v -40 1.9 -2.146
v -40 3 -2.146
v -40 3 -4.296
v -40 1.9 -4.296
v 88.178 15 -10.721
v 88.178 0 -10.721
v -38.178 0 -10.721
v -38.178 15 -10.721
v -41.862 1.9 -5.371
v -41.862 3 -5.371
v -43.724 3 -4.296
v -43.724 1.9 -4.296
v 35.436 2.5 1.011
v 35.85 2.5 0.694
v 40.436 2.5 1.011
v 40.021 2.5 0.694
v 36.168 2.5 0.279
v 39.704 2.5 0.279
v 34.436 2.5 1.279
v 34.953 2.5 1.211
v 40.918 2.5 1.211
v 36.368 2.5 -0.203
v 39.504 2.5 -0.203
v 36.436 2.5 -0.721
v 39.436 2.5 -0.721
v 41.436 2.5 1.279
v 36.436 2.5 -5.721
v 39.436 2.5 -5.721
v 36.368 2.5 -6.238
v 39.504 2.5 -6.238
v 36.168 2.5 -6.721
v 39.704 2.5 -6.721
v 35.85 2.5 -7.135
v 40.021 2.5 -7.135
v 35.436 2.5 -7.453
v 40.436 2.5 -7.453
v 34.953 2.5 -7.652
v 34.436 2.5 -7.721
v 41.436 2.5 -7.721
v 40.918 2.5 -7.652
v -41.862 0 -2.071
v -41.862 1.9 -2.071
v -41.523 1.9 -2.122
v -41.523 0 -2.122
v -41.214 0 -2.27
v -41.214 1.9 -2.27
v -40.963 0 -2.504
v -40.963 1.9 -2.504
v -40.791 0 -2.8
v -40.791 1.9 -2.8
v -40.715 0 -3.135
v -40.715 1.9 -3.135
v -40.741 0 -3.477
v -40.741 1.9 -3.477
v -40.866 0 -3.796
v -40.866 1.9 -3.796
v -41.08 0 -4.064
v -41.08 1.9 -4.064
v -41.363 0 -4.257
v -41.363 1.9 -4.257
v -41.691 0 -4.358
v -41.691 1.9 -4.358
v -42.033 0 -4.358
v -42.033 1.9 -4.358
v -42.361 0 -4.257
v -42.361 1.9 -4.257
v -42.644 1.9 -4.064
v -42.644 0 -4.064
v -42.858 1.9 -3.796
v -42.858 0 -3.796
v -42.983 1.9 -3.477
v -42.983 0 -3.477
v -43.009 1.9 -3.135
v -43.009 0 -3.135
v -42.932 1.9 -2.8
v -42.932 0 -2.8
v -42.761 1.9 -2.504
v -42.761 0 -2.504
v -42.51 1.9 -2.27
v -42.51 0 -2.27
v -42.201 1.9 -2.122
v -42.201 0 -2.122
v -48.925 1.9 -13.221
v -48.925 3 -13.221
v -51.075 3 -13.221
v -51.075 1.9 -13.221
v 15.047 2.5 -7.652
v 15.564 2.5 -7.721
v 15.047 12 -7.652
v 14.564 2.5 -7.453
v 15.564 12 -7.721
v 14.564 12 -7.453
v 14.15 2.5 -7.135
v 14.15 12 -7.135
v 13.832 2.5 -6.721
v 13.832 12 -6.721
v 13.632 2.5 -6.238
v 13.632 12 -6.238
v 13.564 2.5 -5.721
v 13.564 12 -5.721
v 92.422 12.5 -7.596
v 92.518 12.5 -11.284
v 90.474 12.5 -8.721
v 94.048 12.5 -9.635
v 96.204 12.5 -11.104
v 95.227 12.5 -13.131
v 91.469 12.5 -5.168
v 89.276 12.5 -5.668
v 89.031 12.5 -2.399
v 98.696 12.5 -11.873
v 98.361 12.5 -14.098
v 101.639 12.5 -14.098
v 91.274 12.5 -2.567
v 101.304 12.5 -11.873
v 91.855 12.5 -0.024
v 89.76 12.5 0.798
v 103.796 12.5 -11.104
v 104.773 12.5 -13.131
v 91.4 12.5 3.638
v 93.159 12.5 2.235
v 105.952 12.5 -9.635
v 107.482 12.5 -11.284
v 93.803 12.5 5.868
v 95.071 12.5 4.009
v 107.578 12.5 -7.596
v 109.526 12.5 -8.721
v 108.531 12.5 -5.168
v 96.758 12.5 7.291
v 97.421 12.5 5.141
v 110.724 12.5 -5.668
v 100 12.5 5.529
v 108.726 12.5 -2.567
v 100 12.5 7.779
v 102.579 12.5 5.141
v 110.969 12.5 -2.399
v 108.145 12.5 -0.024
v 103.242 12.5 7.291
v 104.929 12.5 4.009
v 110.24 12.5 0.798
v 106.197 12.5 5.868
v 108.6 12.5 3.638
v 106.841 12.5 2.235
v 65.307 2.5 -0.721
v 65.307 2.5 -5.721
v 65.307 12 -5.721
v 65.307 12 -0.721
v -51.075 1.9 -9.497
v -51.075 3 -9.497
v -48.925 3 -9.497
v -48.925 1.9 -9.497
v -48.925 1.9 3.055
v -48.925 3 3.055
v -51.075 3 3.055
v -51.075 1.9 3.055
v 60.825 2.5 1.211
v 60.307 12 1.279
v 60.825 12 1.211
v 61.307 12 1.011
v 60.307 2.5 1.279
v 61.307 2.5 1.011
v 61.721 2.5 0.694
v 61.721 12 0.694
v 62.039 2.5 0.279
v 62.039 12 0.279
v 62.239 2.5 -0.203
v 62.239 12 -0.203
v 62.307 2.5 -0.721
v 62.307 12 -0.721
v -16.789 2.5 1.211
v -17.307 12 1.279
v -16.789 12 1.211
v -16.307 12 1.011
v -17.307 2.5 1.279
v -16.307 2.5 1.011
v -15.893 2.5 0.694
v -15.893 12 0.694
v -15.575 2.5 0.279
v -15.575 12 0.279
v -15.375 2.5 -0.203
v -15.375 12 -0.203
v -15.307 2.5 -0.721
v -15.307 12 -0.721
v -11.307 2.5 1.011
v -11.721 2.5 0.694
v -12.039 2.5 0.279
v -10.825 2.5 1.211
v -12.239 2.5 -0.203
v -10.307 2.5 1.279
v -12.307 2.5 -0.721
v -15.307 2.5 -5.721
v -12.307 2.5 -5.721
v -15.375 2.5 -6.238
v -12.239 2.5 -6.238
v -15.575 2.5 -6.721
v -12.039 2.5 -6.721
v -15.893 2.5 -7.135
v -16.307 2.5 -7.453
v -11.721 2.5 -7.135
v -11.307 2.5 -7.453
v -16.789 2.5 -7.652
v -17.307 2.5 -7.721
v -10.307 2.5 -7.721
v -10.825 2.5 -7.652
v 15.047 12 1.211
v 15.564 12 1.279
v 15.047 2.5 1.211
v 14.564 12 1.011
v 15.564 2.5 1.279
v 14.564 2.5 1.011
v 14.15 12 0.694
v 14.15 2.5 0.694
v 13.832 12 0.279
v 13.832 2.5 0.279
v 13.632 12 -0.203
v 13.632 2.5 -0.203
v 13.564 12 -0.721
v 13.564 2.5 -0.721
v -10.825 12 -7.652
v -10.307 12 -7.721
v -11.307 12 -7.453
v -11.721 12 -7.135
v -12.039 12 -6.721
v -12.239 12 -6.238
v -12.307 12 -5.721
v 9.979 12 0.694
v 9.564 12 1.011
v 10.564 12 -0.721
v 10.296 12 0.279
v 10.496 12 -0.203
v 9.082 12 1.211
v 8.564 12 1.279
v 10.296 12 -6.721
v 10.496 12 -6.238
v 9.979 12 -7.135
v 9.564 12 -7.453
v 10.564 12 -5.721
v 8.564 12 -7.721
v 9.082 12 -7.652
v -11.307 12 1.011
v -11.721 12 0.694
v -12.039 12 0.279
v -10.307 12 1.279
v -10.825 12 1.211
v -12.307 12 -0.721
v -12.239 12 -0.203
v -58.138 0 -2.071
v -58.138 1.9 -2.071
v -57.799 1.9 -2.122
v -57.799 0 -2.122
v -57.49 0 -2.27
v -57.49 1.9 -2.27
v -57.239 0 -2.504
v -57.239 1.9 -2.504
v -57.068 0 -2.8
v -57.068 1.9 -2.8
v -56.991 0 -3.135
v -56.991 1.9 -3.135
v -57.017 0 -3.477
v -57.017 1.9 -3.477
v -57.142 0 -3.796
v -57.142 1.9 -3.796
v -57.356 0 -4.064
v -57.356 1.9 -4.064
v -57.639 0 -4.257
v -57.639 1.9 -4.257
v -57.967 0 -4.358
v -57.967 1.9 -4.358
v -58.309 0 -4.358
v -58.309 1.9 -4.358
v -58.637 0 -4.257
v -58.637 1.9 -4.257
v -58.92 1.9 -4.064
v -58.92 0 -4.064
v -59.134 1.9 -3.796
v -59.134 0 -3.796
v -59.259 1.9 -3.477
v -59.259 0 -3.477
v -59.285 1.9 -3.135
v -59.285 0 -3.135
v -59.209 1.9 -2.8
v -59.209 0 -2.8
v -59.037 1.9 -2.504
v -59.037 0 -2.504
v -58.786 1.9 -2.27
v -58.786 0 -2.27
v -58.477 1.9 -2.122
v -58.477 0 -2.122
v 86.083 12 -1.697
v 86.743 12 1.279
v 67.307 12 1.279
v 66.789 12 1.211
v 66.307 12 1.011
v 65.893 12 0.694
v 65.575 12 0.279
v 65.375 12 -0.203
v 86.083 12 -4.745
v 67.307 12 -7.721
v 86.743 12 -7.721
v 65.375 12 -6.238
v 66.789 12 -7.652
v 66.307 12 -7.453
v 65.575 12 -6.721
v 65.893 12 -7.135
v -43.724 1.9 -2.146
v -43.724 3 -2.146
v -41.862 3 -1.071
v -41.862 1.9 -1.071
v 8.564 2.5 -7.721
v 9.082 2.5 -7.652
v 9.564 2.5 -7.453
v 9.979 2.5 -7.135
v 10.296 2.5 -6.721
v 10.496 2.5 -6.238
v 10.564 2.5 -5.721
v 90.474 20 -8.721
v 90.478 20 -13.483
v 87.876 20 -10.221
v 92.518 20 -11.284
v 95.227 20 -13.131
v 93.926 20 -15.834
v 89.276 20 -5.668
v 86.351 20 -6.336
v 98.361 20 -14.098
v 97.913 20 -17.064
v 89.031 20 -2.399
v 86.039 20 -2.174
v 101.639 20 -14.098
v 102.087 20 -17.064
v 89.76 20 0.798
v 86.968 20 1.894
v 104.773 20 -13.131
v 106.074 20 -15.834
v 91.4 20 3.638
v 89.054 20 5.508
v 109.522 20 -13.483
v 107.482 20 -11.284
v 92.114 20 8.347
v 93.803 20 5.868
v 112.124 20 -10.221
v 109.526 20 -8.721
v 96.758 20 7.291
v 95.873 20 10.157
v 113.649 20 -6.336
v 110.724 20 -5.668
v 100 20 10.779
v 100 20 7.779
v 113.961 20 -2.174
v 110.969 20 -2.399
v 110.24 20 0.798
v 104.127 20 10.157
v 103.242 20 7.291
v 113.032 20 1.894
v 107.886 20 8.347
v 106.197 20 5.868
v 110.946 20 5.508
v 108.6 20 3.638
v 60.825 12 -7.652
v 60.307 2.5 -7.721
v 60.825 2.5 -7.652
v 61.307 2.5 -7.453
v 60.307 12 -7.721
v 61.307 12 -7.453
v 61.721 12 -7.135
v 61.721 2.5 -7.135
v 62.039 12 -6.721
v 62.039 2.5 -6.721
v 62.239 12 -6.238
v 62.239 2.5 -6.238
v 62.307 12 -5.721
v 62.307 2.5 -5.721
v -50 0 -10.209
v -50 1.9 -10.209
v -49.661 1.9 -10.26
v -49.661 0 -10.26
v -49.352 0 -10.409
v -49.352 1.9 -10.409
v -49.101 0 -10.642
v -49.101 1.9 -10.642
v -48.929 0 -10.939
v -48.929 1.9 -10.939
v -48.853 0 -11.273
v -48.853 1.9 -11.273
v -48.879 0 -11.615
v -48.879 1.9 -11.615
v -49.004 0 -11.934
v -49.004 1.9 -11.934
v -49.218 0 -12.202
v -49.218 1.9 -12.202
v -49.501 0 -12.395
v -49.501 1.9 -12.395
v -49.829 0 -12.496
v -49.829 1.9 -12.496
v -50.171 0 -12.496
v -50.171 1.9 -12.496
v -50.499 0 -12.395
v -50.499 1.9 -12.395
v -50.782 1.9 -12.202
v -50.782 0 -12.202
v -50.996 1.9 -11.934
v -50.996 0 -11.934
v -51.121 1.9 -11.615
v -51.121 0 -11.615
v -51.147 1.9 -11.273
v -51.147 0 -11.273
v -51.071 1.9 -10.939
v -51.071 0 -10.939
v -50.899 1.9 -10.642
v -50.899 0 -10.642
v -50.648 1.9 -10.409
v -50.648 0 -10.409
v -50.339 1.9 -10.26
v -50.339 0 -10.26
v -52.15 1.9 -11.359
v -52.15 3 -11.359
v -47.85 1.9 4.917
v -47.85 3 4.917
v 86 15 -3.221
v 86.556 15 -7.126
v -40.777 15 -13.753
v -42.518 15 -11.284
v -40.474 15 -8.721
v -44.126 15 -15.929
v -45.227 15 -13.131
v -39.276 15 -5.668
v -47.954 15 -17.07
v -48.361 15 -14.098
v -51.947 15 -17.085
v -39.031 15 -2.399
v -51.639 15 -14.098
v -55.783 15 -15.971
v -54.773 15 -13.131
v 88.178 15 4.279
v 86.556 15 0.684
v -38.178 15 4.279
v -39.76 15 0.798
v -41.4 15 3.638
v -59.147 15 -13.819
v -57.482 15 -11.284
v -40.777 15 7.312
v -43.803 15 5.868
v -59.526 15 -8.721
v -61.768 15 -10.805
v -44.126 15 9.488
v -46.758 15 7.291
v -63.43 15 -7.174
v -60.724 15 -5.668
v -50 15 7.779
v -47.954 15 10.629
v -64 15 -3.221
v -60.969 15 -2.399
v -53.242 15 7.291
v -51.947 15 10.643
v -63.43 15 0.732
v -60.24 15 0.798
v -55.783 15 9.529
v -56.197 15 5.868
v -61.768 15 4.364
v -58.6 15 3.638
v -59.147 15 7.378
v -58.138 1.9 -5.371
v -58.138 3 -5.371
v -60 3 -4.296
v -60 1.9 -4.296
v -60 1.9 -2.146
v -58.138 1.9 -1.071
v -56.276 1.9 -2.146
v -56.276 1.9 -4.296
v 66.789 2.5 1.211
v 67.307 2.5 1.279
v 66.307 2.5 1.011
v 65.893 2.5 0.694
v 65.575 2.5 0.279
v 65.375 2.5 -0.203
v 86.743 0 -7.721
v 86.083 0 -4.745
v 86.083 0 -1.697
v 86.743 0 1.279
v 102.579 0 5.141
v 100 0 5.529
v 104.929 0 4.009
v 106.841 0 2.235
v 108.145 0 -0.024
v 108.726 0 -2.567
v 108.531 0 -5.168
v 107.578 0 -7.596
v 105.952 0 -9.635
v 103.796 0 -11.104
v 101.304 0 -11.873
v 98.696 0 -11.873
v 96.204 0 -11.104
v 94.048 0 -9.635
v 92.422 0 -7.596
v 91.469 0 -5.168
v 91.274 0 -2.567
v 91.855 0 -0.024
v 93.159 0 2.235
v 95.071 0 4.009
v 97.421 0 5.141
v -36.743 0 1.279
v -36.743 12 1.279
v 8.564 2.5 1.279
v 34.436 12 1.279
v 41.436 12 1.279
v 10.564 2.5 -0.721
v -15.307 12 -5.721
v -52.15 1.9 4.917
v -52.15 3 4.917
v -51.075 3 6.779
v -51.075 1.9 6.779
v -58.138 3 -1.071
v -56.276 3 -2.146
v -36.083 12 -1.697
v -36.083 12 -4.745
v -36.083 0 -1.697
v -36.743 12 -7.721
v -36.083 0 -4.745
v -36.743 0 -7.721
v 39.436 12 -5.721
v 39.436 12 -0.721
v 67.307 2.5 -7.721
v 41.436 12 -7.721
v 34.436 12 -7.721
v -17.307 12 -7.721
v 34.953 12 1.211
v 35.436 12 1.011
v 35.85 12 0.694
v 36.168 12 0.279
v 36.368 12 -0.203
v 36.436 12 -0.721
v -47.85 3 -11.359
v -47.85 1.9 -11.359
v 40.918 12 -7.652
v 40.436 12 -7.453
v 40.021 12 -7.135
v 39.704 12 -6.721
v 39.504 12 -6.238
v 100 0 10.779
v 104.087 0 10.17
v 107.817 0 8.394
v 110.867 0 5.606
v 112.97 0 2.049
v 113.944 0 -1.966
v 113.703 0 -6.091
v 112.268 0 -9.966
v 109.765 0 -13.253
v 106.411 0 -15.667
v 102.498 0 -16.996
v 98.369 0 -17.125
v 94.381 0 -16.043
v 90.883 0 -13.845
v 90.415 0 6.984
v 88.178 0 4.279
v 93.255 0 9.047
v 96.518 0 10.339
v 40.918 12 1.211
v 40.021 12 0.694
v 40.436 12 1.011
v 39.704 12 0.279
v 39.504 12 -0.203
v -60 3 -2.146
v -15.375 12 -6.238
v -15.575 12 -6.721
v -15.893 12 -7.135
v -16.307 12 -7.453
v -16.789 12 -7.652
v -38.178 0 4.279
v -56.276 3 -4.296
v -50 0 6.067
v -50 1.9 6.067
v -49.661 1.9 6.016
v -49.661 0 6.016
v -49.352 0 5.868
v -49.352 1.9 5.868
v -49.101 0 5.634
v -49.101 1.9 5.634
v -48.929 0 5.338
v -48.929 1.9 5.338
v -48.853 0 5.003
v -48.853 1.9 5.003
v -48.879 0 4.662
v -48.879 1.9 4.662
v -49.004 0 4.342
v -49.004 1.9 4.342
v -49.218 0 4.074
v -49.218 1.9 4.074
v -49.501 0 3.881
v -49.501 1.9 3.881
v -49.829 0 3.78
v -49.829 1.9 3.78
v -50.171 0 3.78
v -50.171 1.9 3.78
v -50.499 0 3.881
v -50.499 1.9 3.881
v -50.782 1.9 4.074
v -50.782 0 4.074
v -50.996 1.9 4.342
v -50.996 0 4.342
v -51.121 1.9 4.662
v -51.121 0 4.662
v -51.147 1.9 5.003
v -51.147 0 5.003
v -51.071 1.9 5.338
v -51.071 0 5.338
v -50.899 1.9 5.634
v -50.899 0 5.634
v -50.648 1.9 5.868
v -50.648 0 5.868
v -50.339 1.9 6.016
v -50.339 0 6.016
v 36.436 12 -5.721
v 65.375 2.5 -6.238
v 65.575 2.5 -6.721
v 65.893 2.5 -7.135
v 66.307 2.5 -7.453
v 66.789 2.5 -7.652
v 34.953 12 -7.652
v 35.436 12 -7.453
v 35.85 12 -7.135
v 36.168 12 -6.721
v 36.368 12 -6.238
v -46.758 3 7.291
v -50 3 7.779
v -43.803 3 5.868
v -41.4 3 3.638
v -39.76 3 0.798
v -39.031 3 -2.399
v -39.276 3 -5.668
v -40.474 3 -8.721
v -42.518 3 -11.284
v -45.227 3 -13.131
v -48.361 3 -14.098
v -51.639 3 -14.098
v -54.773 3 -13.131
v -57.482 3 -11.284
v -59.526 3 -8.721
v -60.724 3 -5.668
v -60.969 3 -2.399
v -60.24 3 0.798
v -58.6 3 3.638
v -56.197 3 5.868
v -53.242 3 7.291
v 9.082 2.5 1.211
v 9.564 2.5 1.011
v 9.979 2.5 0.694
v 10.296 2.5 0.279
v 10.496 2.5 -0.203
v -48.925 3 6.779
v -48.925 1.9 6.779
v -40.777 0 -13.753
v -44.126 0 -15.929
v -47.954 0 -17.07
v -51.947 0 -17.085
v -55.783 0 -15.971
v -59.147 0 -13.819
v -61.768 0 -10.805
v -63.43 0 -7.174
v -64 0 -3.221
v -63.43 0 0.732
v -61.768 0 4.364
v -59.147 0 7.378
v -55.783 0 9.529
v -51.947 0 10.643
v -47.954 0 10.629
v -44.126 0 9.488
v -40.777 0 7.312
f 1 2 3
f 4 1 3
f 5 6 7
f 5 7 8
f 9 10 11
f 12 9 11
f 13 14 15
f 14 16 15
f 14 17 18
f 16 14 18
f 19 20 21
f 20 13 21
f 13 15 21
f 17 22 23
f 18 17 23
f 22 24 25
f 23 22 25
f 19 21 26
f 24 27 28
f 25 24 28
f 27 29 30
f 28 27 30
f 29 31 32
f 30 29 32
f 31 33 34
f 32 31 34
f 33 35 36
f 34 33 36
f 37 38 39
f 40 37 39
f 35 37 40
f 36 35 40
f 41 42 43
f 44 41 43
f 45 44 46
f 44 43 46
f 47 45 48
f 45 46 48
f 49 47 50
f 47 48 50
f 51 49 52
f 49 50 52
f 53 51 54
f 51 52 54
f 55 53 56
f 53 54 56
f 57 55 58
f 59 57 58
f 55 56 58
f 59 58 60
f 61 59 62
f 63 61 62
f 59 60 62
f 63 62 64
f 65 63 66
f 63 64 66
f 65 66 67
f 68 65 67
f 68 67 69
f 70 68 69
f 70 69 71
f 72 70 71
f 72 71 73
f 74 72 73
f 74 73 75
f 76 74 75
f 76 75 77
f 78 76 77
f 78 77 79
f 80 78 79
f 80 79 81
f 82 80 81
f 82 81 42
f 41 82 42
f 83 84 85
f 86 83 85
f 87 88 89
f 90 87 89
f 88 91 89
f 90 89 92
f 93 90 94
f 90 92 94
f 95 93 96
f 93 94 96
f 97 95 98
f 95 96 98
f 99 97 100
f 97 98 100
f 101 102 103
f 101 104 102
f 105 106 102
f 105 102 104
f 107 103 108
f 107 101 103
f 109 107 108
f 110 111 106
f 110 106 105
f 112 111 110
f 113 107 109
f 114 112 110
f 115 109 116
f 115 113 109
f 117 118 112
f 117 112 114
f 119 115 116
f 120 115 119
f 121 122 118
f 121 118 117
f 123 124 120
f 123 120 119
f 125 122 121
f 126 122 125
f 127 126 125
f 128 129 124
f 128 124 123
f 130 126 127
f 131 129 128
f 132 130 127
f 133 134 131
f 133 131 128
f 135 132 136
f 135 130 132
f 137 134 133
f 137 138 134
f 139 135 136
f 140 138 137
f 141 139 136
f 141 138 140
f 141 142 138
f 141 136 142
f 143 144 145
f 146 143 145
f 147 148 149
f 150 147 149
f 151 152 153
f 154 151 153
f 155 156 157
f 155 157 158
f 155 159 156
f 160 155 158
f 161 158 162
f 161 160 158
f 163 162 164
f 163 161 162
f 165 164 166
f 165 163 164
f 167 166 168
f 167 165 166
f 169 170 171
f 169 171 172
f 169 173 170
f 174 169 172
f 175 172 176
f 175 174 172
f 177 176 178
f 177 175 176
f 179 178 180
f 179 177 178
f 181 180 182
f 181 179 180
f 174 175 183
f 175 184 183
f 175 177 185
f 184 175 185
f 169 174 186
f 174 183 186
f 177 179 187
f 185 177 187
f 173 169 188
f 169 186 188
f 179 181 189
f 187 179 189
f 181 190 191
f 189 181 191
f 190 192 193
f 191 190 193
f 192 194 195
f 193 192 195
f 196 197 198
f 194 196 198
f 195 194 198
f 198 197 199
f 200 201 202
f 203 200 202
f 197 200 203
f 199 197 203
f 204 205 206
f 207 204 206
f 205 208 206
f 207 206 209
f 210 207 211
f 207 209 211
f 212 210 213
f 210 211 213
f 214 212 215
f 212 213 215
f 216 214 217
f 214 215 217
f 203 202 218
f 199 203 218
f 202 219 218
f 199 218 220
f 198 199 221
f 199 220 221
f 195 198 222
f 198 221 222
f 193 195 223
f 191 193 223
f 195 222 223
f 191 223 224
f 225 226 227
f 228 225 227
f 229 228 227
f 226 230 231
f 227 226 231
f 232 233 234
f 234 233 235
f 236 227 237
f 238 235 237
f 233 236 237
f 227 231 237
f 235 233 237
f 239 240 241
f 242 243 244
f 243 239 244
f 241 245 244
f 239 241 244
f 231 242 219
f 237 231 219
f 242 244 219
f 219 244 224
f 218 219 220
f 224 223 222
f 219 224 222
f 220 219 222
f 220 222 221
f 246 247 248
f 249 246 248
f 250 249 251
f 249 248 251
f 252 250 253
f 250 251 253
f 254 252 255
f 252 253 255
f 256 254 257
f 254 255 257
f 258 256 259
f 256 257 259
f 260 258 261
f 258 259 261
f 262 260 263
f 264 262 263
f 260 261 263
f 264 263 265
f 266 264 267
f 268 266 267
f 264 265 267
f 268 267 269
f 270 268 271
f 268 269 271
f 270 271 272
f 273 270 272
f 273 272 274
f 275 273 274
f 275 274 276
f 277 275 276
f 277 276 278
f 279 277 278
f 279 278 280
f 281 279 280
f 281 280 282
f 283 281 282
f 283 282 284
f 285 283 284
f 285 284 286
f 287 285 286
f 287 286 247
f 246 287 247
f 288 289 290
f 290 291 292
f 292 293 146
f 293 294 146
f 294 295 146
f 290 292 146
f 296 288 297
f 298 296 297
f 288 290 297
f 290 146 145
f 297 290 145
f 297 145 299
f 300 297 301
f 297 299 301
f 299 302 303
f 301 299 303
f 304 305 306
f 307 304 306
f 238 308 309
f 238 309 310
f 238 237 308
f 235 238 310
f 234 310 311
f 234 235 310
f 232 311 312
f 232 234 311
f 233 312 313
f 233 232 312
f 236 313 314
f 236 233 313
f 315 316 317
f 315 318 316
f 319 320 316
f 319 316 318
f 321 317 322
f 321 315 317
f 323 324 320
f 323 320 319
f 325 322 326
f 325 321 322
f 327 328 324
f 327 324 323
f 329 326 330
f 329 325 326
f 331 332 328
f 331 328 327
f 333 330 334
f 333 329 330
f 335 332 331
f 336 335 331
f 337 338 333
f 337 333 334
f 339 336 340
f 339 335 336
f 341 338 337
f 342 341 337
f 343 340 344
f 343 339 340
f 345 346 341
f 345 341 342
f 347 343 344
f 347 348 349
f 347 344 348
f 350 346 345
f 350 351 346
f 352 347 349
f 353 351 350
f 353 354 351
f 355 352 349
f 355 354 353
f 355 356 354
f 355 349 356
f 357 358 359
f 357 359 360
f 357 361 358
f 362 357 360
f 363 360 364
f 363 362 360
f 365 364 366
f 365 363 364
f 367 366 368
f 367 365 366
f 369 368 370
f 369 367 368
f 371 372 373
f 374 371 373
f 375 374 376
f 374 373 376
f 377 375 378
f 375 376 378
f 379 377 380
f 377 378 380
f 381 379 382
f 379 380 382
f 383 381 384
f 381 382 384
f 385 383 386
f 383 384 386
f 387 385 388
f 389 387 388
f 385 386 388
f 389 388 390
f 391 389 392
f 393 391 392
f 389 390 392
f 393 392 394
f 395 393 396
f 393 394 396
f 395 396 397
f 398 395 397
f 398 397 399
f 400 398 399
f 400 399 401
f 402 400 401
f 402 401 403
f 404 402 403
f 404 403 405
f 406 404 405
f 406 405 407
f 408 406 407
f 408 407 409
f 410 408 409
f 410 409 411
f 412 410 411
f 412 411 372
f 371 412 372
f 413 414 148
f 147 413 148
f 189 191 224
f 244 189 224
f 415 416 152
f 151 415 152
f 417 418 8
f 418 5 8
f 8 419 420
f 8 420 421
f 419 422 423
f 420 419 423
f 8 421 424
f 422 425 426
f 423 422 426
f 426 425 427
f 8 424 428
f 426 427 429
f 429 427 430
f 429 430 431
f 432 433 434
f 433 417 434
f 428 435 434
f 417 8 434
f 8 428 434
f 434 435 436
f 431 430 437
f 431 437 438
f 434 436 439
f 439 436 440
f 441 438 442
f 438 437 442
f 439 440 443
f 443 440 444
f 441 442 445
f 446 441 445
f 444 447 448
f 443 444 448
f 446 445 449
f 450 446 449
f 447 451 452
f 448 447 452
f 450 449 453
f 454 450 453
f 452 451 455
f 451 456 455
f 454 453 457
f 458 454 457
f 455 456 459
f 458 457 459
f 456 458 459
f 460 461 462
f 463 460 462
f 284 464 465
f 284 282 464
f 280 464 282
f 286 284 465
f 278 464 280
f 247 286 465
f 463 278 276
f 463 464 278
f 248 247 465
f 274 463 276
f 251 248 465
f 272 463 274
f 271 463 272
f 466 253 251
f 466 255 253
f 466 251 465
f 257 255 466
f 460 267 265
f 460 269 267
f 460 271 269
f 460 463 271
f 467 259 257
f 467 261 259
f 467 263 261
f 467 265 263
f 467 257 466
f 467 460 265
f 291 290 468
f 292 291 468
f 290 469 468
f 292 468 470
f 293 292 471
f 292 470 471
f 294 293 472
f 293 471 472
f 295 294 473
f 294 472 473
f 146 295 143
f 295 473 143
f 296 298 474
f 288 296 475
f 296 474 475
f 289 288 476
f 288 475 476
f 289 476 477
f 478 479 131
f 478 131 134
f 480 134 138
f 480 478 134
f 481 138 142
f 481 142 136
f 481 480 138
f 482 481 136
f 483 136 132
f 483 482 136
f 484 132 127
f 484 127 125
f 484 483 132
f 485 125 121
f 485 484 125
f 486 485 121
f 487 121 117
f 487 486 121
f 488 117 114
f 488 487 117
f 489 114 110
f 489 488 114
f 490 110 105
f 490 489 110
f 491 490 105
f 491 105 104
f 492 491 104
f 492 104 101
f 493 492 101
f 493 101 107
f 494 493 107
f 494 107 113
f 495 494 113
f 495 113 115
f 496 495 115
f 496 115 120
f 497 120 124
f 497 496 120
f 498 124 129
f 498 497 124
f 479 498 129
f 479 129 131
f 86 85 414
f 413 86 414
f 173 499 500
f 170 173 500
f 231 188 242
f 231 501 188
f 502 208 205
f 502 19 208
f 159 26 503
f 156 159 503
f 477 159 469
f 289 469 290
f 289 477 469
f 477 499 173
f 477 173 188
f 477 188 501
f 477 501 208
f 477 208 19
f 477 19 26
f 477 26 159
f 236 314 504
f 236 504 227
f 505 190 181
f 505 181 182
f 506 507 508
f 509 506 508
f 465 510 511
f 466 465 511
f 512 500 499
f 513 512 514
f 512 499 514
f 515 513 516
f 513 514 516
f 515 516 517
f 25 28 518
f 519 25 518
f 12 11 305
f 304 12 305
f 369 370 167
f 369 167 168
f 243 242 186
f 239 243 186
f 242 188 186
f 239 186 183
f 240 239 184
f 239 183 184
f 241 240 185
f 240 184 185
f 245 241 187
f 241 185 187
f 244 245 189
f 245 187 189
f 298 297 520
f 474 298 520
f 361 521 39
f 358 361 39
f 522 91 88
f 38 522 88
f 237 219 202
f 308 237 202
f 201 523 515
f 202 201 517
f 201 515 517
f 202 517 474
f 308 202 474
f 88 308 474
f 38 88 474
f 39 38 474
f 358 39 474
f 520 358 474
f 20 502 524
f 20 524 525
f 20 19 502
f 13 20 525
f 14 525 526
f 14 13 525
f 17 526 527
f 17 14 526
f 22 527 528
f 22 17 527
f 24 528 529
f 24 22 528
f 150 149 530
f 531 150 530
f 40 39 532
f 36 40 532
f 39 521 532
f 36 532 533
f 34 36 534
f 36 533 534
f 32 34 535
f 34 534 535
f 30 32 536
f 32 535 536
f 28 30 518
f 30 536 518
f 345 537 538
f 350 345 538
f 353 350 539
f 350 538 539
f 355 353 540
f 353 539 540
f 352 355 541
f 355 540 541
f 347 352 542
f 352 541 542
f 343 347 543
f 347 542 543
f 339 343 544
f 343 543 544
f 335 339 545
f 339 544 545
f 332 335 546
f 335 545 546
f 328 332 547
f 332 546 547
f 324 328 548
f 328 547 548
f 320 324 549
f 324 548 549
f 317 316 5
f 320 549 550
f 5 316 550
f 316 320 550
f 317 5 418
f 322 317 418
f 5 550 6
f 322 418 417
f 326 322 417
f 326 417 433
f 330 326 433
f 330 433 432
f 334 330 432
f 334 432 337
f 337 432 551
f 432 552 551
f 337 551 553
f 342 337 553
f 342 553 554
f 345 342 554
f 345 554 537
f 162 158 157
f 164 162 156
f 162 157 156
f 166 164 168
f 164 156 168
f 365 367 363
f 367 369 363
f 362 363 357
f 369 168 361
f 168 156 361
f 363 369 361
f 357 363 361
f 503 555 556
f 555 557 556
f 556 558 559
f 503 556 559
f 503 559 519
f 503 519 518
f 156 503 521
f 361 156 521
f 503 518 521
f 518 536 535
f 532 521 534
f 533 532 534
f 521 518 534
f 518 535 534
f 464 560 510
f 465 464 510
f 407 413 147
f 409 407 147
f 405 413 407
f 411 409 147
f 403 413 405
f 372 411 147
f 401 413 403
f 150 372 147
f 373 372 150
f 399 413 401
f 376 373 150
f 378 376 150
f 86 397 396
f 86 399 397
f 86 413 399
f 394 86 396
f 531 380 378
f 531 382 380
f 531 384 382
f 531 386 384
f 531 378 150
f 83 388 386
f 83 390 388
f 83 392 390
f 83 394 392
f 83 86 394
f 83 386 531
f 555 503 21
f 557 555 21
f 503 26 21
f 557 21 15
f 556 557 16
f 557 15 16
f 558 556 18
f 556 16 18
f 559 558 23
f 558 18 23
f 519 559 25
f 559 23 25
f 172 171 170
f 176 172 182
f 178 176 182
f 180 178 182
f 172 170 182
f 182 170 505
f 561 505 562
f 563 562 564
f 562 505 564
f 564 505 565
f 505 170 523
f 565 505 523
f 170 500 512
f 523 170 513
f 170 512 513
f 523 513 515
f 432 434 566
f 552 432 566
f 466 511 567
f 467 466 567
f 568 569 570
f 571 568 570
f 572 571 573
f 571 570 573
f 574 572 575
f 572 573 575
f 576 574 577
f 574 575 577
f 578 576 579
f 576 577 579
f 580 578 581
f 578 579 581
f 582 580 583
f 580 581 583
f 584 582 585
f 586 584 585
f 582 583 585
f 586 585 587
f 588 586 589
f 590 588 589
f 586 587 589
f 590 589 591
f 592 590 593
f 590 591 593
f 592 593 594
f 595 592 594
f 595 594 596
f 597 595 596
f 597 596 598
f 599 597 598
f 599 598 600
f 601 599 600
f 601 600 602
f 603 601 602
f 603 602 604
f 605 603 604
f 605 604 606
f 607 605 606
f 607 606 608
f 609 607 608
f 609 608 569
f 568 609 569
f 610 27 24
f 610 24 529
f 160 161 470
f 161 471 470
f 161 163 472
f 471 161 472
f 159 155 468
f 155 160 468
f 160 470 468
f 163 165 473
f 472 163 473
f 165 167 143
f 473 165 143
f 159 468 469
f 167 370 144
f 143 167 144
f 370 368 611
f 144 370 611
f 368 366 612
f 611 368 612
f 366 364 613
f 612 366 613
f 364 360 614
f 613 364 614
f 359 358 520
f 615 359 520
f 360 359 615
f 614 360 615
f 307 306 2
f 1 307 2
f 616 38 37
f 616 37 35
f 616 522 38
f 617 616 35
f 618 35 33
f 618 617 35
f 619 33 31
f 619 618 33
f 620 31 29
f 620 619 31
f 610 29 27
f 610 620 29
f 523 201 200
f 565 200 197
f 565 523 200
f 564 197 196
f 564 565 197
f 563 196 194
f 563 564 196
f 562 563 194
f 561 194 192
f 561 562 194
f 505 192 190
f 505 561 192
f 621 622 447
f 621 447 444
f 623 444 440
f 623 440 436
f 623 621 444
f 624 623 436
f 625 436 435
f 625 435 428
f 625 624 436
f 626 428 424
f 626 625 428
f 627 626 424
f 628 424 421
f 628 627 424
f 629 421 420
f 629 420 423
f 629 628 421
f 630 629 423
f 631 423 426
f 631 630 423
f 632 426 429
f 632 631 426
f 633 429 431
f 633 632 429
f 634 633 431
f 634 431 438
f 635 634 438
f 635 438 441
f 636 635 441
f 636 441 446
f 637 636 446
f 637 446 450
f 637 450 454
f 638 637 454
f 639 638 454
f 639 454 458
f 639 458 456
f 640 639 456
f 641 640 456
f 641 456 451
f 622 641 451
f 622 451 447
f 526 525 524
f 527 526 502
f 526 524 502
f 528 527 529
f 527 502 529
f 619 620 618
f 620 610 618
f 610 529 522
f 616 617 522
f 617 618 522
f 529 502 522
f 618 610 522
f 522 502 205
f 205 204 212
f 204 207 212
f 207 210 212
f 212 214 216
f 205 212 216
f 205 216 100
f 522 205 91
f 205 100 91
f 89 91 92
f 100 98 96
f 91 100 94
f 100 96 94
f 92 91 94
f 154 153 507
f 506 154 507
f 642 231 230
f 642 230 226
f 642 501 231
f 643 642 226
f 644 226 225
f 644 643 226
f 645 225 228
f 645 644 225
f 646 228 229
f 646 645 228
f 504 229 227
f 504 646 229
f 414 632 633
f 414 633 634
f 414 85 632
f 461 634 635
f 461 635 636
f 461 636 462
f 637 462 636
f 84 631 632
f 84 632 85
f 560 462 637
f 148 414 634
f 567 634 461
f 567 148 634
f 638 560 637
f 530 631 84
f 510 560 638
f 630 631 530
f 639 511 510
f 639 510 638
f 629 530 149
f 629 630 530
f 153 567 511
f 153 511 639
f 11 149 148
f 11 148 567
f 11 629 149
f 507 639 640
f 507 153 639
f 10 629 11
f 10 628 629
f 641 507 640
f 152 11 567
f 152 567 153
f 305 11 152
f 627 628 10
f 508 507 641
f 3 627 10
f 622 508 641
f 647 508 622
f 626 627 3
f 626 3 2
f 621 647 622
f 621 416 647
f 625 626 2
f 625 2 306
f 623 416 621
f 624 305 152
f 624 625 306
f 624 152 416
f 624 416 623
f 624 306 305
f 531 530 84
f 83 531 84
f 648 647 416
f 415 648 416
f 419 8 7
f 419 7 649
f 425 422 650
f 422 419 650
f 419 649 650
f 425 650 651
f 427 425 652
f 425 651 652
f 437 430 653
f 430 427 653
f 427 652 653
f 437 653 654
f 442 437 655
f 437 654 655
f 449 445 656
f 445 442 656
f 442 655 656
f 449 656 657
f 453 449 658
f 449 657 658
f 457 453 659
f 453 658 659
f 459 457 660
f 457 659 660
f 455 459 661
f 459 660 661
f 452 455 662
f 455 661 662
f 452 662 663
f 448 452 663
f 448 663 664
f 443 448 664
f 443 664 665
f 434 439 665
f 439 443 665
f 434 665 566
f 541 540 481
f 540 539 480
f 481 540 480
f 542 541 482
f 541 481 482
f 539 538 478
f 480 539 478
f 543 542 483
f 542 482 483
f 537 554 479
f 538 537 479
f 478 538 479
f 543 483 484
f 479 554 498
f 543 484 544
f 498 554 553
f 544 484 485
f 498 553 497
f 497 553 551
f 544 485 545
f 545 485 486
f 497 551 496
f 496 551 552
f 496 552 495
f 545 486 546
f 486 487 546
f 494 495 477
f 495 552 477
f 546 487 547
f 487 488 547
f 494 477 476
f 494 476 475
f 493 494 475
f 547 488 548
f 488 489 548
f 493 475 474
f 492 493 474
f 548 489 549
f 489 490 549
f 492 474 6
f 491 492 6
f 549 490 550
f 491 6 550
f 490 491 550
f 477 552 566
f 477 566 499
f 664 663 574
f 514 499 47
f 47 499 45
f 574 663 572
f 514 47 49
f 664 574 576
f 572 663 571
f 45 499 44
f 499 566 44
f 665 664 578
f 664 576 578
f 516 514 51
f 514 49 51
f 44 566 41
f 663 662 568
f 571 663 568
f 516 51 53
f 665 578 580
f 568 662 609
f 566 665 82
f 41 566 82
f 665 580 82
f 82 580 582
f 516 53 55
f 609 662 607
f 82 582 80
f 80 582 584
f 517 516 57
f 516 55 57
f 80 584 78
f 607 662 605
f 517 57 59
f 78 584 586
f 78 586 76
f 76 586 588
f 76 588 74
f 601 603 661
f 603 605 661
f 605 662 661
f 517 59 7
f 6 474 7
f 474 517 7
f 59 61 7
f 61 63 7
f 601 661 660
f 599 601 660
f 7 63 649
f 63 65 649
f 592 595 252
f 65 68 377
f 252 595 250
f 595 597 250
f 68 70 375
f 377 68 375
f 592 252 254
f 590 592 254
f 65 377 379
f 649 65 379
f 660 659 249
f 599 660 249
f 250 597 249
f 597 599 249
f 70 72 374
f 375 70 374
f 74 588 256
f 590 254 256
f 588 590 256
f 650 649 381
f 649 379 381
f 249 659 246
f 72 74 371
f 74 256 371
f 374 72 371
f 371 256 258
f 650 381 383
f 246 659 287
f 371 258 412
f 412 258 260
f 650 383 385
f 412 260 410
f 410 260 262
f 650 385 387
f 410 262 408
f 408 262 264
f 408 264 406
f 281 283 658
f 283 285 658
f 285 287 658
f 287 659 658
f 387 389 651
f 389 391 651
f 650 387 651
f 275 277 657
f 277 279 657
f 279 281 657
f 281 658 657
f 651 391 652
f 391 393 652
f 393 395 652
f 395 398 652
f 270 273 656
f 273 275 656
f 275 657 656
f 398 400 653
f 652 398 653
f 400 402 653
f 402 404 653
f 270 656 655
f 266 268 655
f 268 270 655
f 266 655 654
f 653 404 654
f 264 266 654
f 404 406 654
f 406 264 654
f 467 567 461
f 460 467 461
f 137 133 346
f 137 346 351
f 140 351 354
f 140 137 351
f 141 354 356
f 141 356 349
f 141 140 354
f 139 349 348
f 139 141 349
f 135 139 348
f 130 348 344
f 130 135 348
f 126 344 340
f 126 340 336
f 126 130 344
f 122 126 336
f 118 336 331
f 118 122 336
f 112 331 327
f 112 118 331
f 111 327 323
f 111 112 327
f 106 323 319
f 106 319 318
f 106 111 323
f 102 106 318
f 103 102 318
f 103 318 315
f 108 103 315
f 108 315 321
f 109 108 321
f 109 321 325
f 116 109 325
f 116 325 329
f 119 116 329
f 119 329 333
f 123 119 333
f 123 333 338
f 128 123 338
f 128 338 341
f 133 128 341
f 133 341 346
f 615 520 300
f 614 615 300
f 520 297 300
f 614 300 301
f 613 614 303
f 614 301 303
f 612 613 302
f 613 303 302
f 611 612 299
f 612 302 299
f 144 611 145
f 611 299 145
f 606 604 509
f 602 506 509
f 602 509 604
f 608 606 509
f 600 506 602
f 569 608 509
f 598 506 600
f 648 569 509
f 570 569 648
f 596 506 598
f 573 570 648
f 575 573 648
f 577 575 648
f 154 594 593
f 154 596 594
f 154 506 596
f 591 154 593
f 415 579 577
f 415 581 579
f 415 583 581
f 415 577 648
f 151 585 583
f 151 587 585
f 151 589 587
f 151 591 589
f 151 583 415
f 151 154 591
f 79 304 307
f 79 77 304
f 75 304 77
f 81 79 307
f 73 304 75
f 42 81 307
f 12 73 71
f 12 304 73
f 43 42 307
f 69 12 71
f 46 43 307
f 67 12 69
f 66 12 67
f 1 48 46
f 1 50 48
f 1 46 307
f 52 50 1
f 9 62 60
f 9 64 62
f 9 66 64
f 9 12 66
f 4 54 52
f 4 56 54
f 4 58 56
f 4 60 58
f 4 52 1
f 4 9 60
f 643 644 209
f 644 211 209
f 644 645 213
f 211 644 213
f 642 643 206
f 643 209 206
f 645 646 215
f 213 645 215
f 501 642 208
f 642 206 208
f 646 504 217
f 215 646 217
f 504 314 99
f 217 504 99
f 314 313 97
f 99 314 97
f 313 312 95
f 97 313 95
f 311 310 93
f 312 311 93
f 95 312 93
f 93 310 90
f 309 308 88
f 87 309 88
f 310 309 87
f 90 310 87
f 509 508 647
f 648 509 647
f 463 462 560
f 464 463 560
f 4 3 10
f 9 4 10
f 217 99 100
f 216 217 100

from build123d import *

# Parameters (mm, degrees)
SKETCH2_R                             = 14
SKETCH2_R_2                           = 11
BOSS_EXTRUDE7_DEPTH                   = 15
SKETCH2_12_R                          = 11
BOSS_EXTRUDE10_DEPTH                  = 3
SKETCH2_9_R                           = 14
SKETCH2_9_R_2                         = 11
BOSS_EXTRUDE8_DEPTH                   = 20
SKETCH2_11_R                          = 11
SKETCH2_11_R_2                        = 8.75
BOSS_EXTRUDE9_DEPTH                   = 12.5
BOSS_EXTRUDE11_REACH                  = 119.015
BOSS_EXTRUDE11_END_RADIUS             = 14
BOSS_EXTRUDE11_DIRECTION_2_REACH      = 119.015
BOSS_EXTRUDE11_DIRECTION_2_END_RADIUS = 14
CUT_EXTRUDE6_DEPTH                    = 1.1
SKETCH13_R                            = 1.15
CUT_EXTRUDE7_DEPTH                    = 3
BOSS_EXTRUDE12_REACH                  = 119.21
SKETCH15_W                            = 3
SKETCH15_H                            = 9.5
FILLET1_R                             = 2


with BuildPart() as part:
    # Sketch2 → Boss-Extrude7 (new body)
    with BuildSketch(Plane(origin=(0, 0, 0), x_dir=(1, 0, 0), z_dir=(0, 1, 0))):
        with Locations(Location((-50, 3.220631283, 0), (0, 0, 270))):
            Circle(SKETCH2_R)
        with Locations(Location((-50, 3.220631283, 0), (0, 0, 270))):
            Circle(SKETCH2_R_2, mode=Mode.SUBTRACT)
    extrude(amount=BOSS_EXTRUDE7_DEPTH)

    # Sketch2<12> → Boss-Extrude10 (add)
    with BuildSketch(Plane(origin=(0, 0, 0), x_dir=(1, 0, 0), z_dir=(0, 1, 0))):
        with Locations(Location((-50, 3.220631283, 0), (0, 0, 270))):
            Circle(SKETCH2_12_R)
    extrude(amount=BOSS_EXTRUDE10_DEPTH)


with BuildPart() as body_2:
    # Sketch2<9> → Boss-Extrude8 (new body)
    with BuildSketch(Plane(origin=(0, 0, 0), x_dir=(1, 0, 0), z_dir=(0, 1, 0))):
        with Locations(Location((100, 3.220631283, 0), (0, 0, 270))):
            Circle(SKETCH2_9_R)
        with Locations(Location((100, 3.220631283, 0), (0, 0, 270))):
            Circle(SKETCH2_9_R_2, mode=Mode.SUBTRACT)
    extrude(amount=BOSS_EXTRUDE8_DEPTH)

    # Sketch2<11> → Boss-Extrude9 (add)
    with BuildSketch(Plane(origin=(0, 0, 0), x_dir=(1, 0, 0), z_dir=(0, 1, 0))):
        with Locations(Location((100, 3.220631283, 0), (0, 0, 270))):
            Circle(SKETCH2_11_R)
        with Locations(Location((100, 3.220631283, 0), (0, 0, 270))):
            Circle(SKETCH2_11_R_2, mode=Mode.SUBTRACT)
    extrude(amount=BOSS_EXTRUDE9_DEPTH)


    add(part.part)  # Boss-Extrude11 merges part
    # Boss-Extrude11: up to this cylinder (the profile starts outside it)
    boss_extrude11_end = Plane(origin=(-50, 0.212132, -3.220631283), z_dir=(0, -1, 0)) * Cylinder(BOSS_EXTRUDE11_END_RADIUS, 267.03, mode=Mode.PRIVATE)
    # Sketch3 → Boss-Extrude11 (add, up to the surface)
    with BuildSketch(Plane(origin=(0, 0, 0), x_dir=(0, 0, -1), z_dir=(1, 0, 0)), mode=Mode.PRIVATE) as boss_extrude11_sk1:
        Polygon((10.720631283, 0), (10.720631283, 15), (-4.279368717, 15), (-4.279368717, 0), (-1.279368717, 0), (-1.279368717, 12), (7.720631283, 12), (7.720631283, 0), align=None)
    boss_extrude11_tool1 = extrude(boss_extrude11_sk1.sketch, amount=-BOSS_EXTRUDE11_REACH, mode=Mode.PRIVATE) - boss_extrude11_end
    add(boss_extrude11_tool1.solids().sort_by_distance((0, 0.212132, -9.220631))[0])

    # Boss-Extrude11 direction 2: up to this cylinder (the profile starts outside it)
    boss_extrude11_direction_2_end = Plane(origin=(100, 0.212132, -3.220631283), z_dir=(0, -1, 0)) * Cylinder(BOSS_EXTRUDE11_DIRECTION_2_END_RADIUS, 267.03, mode=Mode.PRIVATE)
    # Sketch3 → Boss-Extrude11 direction 2 (add, up to the surface)
    with BuildSketch(Plane(origin=(0, 0, 0), x_dir=(0, 0, -1), z_dir=(1, 0, 0)), mode=Mode.PRIVATE) as boss_extrude11_direction_2_sk1:
        Polygon((10.720631283, 0), (10.720631283, 15), (-4.279368717, 15), (-4.279368717, 0), (-1.279368717, 0), (-1.279368717, 12), (7.720631283, 12), (7.720631283, 0), align=None)
    boss_extrude11_direction_2_tool1 = extrude(boss_extrude11_direction_2_sk1.sketch, amount=BOSS_EXTRUDE11_DIRECTION_2_REACH, mode=Mode.PRIVATE) - boss_extrude11_direction_2_end
    add(boss_extrude11_direction_2_tool1.solids().sort_by_distance((0, 0.212132, -9.220631))[0])

    # Sketch10 → Cut-Extrude6 (cut)
    with BuildSketch(Plane(origin=(0, 3, 0), x_dir=(1, 0, 0), z_dir=(0, 1, 0))):
        Polygon((-47.85, 11.358676665), (-48.925, 13.220631283), (-51.075, 13.220631283), (-52.15, 11.358676665), (-51.075, 9.496722047), (-48.925, 9.496722047), align=None)
        Polygon((-58.138045382, 5.37063128), (-60, 4.29563128), (-60, 2.14563128), (-58.138045382, 1.07063128), (-56.276090764, 2.14563128), (-56.276090764, 4.29563128), align=None)
        Polygon((-41.861954618, 5.37063128), (-43.723909236, 4.29563128), (-43.723909236, 2.14563128), (-41.861954618, 1.07063128), (-40, 2.14563128), (-40, 4.29563128), align=None)
        Polygon((-47.85, -4.917414098), (-48.925, -3.05545948), (-51.075, -3.05545948), (-52.15, -4.917414098), (-51.075, -6.779368717), (-48.925, -6.779368717), align=None)
    extrude(amount=-CUT_EXTRUDE6_DEPTH, mode=Mode.SUBTRACT)

    # Sketch13 → Cut-Extrude7 (cut)
    with BuildSketch(Plane(origin=(0, 3, 0), x_dir=(1, 0, 0), z_dir=(0, 1, 0))):
        with Locations(Location((-50, 11.35867667, 0), (0, 0, 270))):
            Circle(SKETCH13_R)
        with Locations(Location((-41.86195462, 3.22063128, 0), (0, 0, 270))):
            Circle(SKETCH13_R)
        with Locations(Location((-50, -4.9174141, 0), (0, 0, 270))):
            Circle(SKETCH13_R)
        with Locations(Location((-58.13804538, 3.22063128, 0), (0, 0, 270))):
            Circle(SKETCH13_R)
    extrude(amount=-CUT_EXTRUDE7_DEPTH, mode=Mode.SUBTRACT)

    # Sketch15 → Boss-Extrude12 (add, up to next)
    with BuildSketch(Plane.XY.offset(-7.720631283), mode=Mode.PRIVATE) as boss_extrude12_sk1:
        with Locations((-13.807045748, 7.25)):
            Rectangle(SKETCH15_W, SKETCH15_H)
    boss_extrude12_tool1 = extrude(boss_extrude12_sk1.sketch, amount=BOSS_EXTRUDE12_REACH, mode=Mode.PRIVATE) - body_2.part
    # Sketch15 → Boss-Extrude12 (add, up to next)
    with BuildSketch(Plane.XY.offset(-7.720631283), mode=Mode.PRIVATE) as boss_extrude12_sk2:
        with Locations((12.064318086, 7.25)):
            Rectangle(SKETCH15_W, SKETCH15_H)
    boss_extrude12_tool2 = extrude(boss_extrude12_sk2.sketch, amount=BOSS_EXTRUDE12_REACH, mode=Mode.PRIVATE) - body_2.part
    # Sketch15 → Boss-Extrude12 (add, up to next)
    with BuildSketch(Plane.XY.offset(-7.720631283), mode=Mode.PRIVATE) as boss_extrude12_sk3:
        with Locations((37.93568192, 7.25)):
            Rectangle(SKETCH15_W, SKETCH15_H)
    boss_extrude12_tool3 = extrude(boss_extrude12_sk3.sketch, amount=BOSS_EXTRUDE12_REACH, mode=Mode.PRIVATE) - body_2.part
    # Sketch15 → Boss-Extrude12 (add, up to next)
    with BuildSketch(Plane.XY.offset(-7.720631283), mode=Mode.PRIVATE) as boss_extrude12_sk4:
        with Locations((63.807045754, 7.25)):
            Rectangle(SKETCH15_W, SKETCH15_H)
    boss_extrude12_tool4 = extrude(boss_extrude12_sk4.sketch, amount=BOSS_EXTRUDE12_REACH, mode=Mode.PRIVATE) - body_2.part
    add(boss_extrude12_tool1.solids().sort_by_distance((-13.807046, 7.25, -7.720631))[0])
    add(boss_extrude12_tool2.solids().sort_by_distance((12.064318, 7.25, -7.720631))[0])
    add(boss_extrude12_tool3.solids().sort_by_distance((37.935682, 7.25, -7.720631))[0])
    add(boss_extrude12_tool4.solids().sort_by_distance((63.807046, 7.25, -7.720631))[0])

    # Fillet1
    fillet1_edges = [body_2.edges().sort_by_distance(p)[0] for p in [
        (-15.307045748, 7.25, 1.279368717),
        (-12.307045748, 7.25, 1.279368717),
        (-12.307045748, 7.25, -7.720631283),
        (-15.307045748, 7.25, -7.720631283),
        (13.564318086, 7.25, 1.279368717),
        (10.564318086, 7.25, 1.279368717),
        (13.564318086, 7.25, -7.720631283),
        (10.564318086, 7.25, -7.720631283),
        (36.43568192, 7.25, 1.279368717),
        (39.43568192, 7.25, 1.279368717),
        (39.43568192, 7.25, -7.720631283),
        (36.43568192, 7.25, -7.720631283),
        (62.307045754, 7.25, 1.279368717),
        (65.307045754, 7.25, 1.279368717),
        (65.307045754, 7.25, -7.720631283),
        (62.307045754, 7.25, -7.720631283),
    ]]
    fillet(fillet1_edges, radius=FILLET1_R)


solid = body_2.part
